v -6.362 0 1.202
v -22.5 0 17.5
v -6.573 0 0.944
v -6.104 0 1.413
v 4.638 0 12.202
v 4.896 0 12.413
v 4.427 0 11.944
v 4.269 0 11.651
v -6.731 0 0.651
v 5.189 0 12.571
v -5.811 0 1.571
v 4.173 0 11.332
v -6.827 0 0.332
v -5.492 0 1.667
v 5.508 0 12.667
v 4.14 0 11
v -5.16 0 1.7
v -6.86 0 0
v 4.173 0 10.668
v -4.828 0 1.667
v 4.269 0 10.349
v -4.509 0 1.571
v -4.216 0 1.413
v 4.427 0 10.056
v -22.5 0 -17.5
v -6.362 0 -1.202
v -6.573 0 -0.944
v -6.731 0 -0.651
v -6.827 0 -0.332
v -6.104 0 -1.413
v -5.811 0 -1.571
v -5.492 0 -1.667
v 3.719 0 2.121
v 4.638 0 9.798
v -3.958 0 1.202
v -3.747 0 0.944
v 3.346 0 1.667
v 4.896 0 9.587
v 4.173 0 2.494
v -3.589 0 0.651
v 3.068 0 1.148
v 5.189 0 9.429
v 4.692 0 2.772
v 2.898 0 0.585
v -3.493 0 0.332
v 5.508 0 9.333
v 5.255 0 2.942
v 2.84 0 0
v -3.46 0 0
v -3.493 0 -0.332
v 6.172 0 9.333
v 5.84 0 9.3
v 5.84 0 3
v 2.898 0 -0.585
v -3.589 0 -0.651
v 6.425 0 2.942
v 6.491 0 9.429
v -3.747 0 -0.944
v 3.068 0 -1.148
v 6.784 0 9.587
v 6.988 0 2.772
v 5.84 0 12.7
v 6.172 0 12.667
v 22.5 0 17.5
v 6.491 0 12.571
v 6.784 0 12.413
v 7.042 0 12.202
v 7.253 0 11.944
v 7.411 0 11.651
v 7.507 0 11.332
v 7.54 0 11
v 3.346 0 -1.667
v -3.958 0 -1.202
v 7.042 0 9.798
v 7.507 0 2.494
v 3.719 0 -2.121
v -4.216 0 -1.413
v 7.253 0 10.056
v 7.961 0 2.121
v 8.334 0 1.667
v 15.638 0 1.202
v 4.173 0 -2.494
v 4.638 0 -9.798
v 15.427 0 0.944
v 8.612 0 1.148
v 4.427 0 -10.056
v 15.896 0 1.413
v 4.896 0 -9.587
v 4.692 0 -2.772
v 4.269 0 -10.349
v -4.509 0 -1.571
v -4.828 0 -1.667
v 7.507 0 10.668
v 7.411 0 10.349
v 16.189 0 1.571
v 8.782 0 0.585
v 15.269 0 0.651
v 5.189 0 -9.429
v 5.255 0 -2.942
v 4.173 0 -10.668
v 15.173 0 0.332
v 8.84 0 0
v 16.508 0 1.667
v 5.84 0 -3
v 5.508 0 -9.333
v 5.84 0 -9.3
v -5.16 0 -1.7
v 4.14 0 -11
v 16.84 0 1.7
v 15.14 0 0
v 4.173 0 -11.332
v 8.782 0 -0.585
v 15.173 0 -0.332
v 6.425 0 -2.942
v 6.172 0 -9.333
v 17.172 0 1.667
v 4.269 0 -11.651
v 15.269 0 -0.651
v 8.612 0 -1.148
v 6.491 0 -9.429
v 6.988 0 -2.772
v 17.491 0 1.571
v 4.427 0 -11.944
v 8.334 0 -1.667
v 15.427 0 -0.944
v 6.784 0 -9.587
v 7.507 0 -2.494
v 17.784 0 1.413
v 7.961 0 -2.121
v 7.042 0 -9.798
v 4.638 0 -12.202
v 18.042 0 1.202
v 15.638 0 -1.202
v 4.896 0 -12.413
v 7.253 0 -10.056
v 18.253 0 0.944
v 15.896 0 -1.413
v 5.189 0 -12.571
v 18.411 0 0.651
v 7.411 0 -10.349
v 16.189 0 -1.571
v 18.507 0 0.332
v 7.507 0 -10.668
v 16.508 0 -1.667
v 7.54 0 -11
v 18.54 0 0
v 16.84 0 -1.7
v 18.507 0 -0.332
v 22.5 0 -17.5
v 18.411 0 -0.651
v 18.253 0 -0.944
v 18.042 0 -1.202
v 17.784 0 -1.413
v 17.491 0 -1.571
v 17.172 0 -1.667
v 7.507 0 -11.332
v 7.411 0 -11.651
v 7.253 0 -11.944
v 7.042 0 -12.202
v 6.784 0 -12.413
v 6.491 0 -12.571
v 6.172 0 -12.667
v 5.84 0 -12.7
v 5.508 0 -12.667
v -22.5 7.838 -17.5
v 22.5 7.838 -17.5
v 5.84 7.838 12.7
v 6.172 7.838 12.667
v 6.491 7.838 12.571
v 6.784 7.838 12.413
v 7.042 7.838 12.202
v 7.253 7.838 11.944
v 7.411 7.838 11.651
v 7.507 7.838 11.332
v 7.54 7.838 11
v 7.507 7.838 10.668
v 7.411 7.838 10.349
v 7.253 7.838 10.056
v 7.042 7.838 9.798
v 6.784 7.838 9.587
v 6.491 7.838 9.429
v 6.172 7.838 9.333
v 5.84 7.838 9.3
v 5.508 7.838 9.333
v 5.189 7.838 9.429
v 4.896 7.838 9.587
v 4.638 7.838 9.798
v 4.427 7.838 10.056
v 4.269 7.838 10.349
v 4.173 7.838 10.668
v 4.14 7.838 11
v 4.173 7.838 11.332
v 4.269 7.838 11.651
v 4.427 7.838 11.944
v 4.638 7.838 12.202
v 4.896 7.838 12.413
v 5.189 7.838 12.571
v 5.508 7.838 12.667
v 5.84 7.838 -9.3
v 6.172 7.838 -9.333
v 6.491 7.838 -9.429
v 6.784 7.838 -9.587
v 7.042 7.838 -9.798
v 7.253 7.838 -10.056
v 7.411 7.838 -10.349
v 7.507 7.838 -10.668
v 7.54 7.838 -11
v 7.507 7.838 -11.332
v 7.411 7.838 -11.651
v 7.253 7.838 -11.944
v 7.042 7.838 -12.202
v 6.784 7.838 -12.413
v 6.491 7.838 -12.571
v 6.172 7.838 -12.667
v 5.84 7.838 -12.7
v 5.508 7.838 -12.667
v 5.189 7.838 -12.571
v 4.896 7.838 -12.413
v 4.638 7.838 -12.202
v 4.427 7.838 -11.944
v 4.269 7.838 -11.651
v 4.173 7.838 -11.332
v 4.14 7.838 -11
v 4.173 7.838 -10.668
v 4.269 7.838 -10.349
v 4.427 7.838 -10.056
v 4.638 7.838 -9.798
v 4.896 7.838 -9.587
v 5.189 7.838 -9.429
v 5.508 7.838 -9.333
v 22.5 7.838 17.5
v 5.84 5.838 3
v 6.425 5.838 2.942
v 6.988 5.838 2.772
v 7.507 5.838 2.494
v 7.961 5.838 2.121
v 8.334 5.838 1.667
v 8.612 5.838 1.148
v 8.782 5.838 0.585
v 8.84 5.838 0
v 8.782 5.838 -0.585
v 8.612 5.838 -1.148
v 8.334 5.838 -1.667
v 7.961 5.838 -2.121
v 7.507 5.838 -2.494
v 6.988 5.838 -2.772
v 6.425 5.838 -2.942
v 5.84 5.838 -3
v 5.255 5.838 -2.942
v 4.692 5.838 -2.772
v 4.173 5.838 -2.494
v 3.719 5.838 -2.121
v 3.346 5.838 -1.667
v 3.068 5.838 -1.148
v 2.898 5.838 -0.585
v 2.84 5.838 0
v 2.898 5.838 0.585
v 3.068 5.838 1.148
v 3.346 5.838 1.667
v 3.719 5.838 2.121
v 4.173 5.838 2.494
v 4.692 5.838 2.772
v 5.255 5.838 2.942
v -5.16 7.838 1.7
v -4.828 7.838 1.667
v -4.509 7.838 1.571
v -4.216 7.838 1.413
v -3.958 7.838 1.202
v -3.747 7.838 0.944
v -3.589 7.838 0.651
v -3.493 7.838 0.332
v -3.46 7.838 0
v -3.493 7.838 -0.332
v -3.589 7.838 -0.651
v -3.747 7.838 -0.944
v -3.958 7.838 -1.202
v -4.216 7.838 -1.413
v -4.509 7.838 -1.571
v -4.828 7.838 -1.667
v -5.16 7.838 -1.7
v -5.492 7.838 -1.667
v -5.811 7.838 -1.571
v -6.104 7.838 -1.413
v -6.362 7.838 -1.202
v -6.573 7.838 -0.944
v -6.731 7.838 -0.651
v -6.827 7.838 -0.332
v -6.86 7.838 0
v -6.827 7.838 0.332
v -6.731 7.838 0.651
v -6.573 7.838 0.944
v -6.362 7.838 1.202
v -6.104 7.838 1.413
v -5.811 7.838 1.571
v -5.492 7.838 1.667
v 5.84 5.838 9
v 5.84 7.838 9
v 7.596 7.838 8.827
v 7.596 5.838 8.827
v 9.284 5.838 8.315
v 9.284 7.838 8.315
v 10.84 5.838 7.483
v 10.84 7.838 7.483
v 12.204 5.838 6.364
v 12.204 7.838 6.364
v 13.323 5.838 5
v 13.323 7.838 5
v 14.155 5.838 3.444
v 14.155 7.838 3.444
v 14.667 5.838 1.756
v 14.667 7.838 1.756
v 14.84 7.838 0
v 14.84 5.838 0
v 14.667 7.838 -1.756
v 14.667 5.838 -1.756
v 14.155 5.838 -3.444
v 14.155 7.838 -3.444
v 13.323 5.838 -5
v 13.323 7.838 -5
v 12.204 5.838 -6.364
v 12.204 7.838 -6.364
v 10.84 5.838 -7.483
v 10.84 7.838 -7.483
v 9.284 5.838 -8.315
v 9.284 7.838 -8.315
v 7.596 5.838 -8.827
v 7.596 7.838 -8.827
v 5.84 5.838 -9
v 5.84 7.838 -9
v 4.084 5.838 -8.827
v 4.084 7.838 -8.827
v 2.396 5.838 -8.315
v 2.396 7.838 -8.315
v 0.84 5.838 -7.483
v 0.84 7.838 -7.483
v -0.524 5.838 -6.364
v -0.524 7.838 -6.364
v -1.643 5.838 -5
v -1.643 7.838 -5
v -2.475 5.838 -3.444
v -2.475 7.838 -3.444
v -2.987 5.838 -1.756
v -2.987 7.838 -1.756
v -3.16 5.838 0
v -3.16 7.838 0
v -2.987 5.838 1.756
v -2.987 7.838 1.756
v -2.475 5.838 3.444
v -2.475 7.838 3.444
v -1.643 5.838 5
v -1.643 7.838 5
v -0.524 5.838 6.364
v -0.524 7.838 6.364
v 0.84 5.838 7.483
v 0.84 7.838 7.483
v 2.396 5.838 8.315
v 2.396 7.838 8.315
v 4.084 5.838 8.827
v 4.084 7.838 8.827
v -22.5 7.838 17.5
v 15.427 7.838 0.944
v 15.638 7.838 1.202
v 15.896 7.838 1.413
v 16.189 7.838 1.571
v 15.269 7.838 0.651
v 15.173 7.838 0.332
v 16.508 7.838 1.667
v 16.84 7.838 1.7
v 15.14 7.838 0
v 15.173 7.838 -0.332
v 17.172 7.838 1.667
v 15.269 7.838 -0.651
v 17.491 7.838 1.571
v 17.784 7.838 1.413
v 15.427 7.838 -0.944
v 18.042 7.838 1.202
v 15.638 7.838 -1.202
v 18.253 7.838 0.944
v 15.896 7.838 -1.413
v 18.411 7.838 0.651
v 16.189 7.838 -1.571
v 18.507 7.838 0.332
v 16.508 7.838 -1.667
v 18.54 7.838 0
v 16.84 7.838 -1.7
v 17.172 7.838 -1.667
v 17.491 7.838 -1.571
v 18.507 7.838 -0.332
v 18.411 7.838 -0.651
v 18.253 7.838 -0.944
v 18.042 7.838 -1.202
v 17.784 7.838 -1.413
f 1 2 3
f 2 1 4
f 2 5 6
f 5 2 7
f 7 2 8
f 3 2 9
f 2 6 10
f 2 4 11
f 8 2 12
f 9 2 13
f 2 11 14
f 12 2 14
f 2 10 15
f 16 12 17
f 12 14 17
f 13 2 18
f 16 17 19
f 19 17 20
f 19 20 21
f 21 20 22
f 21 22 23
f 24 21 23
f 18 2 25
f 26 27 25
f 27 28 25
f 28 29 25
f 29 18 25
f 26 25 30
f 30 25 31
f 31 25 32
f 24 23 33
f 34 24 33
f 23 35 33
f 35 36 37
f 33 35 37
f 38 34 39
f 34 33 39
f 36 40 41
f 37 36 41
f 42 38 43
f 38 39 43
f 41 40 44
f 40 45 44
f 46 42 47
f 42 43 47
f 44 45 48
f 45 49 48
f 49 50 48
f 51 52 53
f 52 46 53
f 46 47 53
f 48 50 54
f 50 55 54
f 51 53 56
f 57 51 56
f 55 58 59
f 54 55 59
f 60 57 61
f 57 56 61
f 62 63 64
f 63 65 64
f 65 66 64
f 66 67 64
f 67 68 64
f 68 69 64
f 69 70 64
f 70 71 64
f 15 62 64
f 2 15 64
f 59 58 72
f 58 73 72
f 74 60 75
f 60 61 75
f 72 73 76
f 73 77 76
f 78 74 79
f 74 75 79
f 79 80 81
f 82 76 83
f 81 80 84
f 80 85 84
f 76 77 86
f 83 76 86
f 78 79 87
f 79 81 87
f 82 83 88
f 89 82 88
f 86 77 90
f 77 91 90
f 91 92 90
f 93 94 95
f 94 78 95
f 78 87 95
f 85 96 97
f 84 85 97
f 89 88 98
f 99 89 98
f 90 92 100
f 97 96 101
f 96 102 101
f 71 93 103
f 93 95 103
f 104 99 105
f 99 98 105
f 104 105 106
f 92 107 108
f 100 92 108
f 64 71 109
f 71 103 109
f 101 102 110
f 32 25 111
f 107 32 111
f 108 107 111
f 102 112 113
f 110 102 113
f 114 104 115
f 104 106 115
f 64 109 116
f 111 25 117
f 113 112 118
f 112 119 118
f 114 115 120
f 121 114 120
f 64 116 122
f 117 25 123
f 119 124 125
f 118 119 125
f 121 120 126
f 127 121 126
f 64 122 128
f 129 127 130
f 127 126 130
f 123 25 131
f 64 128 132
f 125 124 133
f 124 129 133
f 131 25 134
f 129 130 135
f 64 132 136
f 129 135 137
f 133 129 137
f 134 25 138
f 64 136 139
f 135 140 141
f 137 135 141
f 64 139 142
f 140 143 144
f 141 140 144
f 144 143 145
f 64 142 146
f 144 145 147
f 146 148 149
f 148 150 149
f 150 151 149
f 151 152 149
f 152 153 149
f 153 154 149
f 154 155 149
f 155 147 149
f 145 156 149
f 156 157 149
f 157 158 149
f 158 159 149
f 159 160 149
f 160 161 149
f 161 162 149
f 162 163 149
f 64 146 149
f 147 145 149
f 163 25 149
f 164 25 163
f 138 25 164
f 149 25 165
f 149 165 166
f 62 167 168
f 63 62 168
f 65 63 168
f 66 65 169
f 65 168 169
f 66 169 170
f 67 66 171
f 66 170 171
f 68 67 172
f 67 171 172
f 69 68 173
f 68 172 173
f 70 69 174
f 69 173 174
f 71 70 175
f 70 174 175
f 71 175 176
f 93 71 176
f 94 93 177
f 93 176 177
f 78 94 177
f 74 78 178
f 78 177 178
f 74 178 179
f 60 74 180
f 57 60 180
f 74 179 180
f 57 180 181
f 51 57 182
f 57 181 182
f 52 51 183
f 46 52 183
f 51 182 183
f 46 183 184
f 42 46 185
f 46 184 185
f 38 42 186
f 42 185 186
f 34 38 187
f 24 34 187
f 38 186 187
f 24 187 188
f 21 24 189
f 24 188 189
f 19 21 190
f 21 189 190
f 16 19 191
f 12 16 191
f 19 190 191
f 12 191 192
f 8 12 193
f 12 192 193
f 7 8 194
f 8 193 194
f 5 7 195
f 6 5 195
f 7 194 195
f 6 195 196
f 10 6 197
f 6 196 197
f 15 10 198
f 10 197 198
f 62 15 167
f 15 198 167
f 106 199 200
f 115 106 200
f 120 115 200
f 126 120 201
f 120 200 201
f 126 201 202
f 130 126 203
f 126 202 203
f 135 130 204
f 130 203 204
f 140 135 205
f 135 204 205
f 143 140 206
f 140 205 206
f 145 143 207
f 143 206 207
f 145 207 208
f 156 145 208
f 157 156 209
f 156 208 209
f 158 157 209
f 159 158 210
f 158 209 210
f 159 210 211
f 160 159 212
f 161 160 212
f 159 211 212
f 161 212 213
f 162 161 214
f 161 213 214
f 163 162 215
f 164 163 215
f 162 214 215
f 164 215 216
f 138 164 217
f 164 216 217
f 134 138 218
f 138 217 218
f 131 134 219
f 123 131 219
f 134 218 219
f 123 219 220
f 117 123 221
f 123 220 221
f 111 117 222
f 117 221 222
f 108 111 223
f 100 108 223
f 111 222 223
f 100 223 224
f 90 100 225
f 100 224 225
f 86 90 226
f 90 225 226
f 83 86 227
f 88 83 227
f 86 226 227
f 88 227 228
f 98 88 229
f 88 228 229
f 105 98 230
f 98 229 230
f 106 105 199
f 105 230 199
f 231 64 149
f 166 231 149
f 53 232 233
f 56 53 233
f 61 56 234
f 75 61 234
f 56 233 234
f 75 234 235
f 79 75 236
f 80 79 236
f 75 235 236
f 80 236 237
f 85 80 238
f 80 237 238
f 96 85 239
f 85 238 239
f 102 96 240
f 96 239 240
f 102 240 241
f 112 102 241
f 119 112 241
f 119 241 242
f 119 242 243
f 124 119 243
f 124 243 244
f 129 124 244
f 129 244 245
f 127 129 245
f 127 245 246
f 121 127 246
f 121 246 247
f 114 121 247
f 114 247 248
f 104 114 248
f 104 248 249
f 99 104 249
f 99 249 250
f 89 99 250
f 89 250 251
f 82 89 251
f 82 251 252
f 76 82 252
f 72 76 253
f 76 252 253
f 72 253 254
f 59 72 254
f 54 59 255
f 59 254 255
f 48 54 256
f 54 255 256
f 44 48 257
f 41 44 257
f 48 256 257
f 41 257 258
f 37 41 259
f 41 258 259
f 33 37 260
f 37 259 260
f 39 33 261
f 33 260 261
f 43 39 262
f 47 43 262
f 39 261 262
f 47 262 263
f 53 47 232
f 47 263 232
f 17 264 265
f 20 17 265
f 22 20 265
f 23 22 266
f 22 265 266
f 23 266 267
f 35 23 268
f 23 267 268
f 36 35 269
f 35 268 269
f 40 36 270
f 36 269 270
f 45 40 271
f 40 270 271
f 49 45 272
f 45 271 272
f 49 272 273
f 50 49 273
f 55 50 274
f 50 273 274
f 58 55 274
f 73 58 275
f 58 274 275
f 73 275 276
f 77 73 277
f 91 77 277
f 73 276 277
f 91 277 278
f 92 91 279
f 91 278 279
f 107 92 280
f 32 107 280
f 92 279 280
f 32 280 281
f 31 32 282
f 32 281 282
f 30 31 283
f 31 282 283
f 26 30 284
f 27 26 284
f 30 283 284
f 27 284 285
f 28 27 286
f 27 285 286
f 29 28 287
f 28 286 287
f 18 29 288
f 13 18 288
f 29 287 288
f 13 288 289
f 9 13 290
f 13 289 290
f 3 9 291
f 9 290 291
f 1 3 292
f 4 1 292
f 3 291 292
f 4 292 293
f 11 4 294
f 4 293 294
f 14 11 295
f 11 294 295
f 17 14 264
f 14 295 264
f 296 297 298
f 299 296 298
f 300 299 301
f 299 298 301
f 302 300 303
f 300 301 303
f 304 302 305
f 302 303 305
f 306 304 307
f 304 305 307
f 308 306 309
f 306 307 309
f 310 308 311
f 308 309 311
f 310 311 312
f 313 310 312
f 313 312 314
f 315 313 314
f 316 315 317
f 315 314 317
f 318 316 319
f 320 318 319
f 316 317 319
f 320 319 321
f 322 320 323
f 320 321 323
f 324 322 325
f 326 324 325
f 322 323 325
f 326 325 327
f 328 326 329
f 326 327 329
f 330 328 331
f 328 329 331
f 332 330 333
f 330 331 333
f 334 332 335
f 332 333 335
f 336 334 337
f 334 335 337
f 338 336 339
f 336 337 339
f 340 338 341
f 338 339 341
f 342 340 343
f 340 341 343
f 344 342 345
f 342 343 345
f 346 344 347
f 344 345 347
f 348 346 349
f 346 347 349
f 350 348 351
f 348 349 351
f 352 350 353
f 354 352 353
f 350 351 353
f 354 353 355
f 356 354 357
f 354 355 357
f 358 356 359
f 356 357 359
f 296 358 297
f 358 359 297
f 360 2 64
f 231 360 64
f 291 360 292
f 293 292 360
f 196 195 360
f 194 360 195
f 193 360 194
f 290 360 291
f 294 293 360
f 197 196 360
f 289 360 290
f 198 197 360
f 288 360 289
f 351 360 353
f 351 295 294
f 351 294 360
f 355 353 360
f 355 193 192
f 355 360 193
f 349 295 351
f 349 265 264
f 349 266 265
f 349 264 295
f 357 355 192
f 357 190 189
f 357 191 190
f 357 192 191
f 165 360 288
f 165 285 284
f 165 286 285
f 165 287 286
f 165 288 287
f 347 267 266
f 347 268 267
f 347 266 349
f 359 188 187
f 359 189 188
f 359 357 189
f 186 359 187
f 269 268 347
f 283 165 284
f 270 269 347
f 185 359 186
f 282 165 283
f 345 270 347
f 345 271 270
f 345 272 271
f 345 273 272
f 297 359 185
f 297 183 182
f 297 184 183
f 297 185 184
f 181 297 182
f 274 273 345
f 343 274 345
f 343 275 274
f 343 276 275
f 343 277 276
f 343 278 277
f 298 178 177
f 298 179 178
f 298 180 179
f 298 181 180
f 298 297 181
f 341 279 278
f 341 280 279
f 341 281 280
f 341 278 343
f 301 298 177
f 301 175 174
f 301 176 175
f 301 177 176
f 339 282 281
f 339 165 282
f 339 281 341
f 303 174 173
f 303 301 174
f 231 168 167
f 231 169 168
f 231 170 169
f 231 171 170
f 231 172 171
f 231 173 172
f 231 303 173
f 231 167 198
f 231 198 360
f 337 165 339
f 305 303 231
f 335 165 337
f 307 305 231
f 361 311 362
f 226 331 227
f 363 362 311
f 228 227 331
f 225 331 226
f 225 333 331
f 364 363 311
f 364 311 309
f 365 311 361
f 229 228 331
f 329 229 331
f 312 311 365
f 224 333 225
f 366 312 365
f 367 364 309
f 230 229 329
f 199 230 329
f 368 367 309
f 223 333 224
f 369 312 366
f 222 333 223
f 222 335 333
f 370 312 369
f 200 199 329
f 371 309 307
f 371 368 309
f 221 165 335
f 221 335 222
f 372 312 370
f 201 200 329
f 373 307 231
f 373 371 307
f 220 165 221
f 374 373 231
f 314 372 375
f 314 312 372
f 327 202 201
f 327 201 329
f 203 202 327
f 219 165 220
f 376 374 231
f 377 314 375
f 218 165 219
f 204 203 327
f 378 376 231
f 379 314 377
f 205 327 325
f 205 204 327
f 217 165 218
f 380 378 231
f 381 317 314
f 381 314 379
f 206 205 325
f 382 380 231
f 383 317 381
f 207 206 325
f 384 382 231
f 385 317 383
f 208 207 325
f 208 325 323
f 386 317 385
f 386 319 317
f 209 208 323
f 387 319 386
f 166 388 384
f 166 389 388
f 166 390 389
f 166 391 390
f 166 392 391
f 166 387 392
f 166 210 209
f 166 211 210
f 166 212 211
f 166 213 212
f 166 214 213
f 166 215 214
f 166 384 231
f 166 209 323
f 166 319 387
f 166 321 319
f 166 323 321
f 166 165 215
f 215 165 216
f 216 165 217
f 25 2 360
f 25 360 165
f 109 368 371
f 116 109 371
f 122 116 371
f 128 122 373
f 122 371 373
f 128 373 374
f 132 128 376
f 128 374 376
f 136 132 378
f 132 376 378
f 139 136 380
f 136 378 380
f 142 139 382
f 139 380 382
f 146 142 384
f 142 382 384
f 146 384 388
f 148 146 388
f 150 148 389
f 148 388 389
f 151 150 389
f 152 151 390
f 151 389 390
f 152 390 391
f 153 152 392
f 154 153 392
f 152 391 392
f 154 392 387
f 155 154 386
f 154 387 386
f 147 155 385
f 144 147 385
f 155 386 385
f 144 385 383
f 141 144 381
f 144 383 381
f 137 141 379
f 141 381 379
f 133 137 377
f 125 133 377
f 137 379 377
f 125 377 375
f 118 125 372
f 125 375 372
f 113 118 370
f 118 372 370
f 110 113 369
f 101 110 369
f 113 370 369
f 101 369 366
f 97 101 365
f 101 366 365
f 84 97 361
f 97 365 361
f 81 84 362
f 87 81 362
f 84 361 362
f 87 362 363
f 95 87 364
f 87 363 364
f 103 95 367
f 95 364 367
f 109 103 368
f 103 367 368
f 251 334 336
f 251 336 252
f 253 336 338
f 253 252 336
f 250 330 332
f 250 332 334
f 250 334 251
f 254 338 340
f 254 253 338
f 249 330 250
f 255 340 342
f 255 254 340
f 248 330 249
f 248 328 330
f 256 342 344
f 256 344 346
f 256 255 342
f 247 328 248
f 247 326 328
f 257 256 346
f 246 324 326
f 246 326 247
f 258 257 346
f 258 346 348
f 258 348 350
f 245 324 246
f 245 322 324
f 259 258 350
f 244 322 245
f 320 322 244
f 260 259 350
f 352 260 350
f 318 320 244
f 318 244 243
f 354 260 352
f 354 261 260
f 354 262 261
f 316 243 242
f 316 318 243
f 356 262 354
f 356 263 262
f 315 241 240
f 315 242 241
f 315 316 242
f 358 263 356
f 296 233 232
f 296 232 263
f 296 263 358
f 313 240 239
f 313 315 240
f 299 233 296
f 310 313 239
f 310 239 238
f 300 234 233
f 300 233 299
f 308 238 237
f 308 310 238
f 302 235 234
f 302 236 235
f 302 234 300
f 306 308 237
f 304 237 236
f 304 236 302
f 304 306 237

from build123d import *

# Parameters (mm, degrees)
SKETCH1_W           = 45
SKETCH1_H           = 35
BOSS_EXTRUDE1_DEPTH = 7.838444594
SKETCH4_R           = 9
CUT_EXTRUDE3_DEPTH  = 2
SKETCH5_R           = 1.7
SKETCH5_R_2         = 3
CUT_EXTRUDE4_DEPTH  = 7.838444594


with BuildPart() as part:
    # Sketch1 → Boss-Extrude1 (new body)
    with BuildSketch(Plane(origin=(0, 0, 0), x_dir=(1, 0, 0), z_dir=(0, 1, 0))):
        Rectangle(SKETCH1_W, SKETCH1_H)
    extrude(amount=BOSS_EXTRUDE1_DEPTH)

    # Sketch4 → Cut-Extrude3 (cut)
    with BuildSketch(Plane(origin=(0, 7.838444594, 0), x_dir=(1, 0, 0), z_dir=(0, 1, 0))):
        with Locations(Location((5.84, 0, 0), (0, 0, 270))):
            Circle(SKETCH4_R)
    extrude(amount=-CUT_EXTRUDE3_DEPTH, mode=Mode.SUBTRACT)

    # Sketch5 → Cut-Extrude4 (cut)
    with BuildSketch(Plane(origin=(0, 7.838444594, 0), x_dir=(1, 0, 0), z_dir=(0, 1, 0))):
        with Locations(Location((5.84, 11, 0), (0, 0, 270))):
            Circle(SKETCH5_R)
        with Locations(Location((16.84, 0, 0), (0, 0, 270))):
            Circle(SKETCH5_R)
        with Locations(Location((5.84, -11, 0), (0, 0, 270))):
            Circle(SKETCH5_R)
        with Locations(Location((-5.16, 0, 0), (0, 0, 270))):
            Circle(SKETCH5_R)
        with Locations(Location((5.84, 0, 0), (0, 0, 270))):
            Circle(SKETCH5_R_2)
    extrude(amount=-CUT_EXTRUDE4_DEPTH, mode=Mode.SUBTRACT)


solid = part.part
